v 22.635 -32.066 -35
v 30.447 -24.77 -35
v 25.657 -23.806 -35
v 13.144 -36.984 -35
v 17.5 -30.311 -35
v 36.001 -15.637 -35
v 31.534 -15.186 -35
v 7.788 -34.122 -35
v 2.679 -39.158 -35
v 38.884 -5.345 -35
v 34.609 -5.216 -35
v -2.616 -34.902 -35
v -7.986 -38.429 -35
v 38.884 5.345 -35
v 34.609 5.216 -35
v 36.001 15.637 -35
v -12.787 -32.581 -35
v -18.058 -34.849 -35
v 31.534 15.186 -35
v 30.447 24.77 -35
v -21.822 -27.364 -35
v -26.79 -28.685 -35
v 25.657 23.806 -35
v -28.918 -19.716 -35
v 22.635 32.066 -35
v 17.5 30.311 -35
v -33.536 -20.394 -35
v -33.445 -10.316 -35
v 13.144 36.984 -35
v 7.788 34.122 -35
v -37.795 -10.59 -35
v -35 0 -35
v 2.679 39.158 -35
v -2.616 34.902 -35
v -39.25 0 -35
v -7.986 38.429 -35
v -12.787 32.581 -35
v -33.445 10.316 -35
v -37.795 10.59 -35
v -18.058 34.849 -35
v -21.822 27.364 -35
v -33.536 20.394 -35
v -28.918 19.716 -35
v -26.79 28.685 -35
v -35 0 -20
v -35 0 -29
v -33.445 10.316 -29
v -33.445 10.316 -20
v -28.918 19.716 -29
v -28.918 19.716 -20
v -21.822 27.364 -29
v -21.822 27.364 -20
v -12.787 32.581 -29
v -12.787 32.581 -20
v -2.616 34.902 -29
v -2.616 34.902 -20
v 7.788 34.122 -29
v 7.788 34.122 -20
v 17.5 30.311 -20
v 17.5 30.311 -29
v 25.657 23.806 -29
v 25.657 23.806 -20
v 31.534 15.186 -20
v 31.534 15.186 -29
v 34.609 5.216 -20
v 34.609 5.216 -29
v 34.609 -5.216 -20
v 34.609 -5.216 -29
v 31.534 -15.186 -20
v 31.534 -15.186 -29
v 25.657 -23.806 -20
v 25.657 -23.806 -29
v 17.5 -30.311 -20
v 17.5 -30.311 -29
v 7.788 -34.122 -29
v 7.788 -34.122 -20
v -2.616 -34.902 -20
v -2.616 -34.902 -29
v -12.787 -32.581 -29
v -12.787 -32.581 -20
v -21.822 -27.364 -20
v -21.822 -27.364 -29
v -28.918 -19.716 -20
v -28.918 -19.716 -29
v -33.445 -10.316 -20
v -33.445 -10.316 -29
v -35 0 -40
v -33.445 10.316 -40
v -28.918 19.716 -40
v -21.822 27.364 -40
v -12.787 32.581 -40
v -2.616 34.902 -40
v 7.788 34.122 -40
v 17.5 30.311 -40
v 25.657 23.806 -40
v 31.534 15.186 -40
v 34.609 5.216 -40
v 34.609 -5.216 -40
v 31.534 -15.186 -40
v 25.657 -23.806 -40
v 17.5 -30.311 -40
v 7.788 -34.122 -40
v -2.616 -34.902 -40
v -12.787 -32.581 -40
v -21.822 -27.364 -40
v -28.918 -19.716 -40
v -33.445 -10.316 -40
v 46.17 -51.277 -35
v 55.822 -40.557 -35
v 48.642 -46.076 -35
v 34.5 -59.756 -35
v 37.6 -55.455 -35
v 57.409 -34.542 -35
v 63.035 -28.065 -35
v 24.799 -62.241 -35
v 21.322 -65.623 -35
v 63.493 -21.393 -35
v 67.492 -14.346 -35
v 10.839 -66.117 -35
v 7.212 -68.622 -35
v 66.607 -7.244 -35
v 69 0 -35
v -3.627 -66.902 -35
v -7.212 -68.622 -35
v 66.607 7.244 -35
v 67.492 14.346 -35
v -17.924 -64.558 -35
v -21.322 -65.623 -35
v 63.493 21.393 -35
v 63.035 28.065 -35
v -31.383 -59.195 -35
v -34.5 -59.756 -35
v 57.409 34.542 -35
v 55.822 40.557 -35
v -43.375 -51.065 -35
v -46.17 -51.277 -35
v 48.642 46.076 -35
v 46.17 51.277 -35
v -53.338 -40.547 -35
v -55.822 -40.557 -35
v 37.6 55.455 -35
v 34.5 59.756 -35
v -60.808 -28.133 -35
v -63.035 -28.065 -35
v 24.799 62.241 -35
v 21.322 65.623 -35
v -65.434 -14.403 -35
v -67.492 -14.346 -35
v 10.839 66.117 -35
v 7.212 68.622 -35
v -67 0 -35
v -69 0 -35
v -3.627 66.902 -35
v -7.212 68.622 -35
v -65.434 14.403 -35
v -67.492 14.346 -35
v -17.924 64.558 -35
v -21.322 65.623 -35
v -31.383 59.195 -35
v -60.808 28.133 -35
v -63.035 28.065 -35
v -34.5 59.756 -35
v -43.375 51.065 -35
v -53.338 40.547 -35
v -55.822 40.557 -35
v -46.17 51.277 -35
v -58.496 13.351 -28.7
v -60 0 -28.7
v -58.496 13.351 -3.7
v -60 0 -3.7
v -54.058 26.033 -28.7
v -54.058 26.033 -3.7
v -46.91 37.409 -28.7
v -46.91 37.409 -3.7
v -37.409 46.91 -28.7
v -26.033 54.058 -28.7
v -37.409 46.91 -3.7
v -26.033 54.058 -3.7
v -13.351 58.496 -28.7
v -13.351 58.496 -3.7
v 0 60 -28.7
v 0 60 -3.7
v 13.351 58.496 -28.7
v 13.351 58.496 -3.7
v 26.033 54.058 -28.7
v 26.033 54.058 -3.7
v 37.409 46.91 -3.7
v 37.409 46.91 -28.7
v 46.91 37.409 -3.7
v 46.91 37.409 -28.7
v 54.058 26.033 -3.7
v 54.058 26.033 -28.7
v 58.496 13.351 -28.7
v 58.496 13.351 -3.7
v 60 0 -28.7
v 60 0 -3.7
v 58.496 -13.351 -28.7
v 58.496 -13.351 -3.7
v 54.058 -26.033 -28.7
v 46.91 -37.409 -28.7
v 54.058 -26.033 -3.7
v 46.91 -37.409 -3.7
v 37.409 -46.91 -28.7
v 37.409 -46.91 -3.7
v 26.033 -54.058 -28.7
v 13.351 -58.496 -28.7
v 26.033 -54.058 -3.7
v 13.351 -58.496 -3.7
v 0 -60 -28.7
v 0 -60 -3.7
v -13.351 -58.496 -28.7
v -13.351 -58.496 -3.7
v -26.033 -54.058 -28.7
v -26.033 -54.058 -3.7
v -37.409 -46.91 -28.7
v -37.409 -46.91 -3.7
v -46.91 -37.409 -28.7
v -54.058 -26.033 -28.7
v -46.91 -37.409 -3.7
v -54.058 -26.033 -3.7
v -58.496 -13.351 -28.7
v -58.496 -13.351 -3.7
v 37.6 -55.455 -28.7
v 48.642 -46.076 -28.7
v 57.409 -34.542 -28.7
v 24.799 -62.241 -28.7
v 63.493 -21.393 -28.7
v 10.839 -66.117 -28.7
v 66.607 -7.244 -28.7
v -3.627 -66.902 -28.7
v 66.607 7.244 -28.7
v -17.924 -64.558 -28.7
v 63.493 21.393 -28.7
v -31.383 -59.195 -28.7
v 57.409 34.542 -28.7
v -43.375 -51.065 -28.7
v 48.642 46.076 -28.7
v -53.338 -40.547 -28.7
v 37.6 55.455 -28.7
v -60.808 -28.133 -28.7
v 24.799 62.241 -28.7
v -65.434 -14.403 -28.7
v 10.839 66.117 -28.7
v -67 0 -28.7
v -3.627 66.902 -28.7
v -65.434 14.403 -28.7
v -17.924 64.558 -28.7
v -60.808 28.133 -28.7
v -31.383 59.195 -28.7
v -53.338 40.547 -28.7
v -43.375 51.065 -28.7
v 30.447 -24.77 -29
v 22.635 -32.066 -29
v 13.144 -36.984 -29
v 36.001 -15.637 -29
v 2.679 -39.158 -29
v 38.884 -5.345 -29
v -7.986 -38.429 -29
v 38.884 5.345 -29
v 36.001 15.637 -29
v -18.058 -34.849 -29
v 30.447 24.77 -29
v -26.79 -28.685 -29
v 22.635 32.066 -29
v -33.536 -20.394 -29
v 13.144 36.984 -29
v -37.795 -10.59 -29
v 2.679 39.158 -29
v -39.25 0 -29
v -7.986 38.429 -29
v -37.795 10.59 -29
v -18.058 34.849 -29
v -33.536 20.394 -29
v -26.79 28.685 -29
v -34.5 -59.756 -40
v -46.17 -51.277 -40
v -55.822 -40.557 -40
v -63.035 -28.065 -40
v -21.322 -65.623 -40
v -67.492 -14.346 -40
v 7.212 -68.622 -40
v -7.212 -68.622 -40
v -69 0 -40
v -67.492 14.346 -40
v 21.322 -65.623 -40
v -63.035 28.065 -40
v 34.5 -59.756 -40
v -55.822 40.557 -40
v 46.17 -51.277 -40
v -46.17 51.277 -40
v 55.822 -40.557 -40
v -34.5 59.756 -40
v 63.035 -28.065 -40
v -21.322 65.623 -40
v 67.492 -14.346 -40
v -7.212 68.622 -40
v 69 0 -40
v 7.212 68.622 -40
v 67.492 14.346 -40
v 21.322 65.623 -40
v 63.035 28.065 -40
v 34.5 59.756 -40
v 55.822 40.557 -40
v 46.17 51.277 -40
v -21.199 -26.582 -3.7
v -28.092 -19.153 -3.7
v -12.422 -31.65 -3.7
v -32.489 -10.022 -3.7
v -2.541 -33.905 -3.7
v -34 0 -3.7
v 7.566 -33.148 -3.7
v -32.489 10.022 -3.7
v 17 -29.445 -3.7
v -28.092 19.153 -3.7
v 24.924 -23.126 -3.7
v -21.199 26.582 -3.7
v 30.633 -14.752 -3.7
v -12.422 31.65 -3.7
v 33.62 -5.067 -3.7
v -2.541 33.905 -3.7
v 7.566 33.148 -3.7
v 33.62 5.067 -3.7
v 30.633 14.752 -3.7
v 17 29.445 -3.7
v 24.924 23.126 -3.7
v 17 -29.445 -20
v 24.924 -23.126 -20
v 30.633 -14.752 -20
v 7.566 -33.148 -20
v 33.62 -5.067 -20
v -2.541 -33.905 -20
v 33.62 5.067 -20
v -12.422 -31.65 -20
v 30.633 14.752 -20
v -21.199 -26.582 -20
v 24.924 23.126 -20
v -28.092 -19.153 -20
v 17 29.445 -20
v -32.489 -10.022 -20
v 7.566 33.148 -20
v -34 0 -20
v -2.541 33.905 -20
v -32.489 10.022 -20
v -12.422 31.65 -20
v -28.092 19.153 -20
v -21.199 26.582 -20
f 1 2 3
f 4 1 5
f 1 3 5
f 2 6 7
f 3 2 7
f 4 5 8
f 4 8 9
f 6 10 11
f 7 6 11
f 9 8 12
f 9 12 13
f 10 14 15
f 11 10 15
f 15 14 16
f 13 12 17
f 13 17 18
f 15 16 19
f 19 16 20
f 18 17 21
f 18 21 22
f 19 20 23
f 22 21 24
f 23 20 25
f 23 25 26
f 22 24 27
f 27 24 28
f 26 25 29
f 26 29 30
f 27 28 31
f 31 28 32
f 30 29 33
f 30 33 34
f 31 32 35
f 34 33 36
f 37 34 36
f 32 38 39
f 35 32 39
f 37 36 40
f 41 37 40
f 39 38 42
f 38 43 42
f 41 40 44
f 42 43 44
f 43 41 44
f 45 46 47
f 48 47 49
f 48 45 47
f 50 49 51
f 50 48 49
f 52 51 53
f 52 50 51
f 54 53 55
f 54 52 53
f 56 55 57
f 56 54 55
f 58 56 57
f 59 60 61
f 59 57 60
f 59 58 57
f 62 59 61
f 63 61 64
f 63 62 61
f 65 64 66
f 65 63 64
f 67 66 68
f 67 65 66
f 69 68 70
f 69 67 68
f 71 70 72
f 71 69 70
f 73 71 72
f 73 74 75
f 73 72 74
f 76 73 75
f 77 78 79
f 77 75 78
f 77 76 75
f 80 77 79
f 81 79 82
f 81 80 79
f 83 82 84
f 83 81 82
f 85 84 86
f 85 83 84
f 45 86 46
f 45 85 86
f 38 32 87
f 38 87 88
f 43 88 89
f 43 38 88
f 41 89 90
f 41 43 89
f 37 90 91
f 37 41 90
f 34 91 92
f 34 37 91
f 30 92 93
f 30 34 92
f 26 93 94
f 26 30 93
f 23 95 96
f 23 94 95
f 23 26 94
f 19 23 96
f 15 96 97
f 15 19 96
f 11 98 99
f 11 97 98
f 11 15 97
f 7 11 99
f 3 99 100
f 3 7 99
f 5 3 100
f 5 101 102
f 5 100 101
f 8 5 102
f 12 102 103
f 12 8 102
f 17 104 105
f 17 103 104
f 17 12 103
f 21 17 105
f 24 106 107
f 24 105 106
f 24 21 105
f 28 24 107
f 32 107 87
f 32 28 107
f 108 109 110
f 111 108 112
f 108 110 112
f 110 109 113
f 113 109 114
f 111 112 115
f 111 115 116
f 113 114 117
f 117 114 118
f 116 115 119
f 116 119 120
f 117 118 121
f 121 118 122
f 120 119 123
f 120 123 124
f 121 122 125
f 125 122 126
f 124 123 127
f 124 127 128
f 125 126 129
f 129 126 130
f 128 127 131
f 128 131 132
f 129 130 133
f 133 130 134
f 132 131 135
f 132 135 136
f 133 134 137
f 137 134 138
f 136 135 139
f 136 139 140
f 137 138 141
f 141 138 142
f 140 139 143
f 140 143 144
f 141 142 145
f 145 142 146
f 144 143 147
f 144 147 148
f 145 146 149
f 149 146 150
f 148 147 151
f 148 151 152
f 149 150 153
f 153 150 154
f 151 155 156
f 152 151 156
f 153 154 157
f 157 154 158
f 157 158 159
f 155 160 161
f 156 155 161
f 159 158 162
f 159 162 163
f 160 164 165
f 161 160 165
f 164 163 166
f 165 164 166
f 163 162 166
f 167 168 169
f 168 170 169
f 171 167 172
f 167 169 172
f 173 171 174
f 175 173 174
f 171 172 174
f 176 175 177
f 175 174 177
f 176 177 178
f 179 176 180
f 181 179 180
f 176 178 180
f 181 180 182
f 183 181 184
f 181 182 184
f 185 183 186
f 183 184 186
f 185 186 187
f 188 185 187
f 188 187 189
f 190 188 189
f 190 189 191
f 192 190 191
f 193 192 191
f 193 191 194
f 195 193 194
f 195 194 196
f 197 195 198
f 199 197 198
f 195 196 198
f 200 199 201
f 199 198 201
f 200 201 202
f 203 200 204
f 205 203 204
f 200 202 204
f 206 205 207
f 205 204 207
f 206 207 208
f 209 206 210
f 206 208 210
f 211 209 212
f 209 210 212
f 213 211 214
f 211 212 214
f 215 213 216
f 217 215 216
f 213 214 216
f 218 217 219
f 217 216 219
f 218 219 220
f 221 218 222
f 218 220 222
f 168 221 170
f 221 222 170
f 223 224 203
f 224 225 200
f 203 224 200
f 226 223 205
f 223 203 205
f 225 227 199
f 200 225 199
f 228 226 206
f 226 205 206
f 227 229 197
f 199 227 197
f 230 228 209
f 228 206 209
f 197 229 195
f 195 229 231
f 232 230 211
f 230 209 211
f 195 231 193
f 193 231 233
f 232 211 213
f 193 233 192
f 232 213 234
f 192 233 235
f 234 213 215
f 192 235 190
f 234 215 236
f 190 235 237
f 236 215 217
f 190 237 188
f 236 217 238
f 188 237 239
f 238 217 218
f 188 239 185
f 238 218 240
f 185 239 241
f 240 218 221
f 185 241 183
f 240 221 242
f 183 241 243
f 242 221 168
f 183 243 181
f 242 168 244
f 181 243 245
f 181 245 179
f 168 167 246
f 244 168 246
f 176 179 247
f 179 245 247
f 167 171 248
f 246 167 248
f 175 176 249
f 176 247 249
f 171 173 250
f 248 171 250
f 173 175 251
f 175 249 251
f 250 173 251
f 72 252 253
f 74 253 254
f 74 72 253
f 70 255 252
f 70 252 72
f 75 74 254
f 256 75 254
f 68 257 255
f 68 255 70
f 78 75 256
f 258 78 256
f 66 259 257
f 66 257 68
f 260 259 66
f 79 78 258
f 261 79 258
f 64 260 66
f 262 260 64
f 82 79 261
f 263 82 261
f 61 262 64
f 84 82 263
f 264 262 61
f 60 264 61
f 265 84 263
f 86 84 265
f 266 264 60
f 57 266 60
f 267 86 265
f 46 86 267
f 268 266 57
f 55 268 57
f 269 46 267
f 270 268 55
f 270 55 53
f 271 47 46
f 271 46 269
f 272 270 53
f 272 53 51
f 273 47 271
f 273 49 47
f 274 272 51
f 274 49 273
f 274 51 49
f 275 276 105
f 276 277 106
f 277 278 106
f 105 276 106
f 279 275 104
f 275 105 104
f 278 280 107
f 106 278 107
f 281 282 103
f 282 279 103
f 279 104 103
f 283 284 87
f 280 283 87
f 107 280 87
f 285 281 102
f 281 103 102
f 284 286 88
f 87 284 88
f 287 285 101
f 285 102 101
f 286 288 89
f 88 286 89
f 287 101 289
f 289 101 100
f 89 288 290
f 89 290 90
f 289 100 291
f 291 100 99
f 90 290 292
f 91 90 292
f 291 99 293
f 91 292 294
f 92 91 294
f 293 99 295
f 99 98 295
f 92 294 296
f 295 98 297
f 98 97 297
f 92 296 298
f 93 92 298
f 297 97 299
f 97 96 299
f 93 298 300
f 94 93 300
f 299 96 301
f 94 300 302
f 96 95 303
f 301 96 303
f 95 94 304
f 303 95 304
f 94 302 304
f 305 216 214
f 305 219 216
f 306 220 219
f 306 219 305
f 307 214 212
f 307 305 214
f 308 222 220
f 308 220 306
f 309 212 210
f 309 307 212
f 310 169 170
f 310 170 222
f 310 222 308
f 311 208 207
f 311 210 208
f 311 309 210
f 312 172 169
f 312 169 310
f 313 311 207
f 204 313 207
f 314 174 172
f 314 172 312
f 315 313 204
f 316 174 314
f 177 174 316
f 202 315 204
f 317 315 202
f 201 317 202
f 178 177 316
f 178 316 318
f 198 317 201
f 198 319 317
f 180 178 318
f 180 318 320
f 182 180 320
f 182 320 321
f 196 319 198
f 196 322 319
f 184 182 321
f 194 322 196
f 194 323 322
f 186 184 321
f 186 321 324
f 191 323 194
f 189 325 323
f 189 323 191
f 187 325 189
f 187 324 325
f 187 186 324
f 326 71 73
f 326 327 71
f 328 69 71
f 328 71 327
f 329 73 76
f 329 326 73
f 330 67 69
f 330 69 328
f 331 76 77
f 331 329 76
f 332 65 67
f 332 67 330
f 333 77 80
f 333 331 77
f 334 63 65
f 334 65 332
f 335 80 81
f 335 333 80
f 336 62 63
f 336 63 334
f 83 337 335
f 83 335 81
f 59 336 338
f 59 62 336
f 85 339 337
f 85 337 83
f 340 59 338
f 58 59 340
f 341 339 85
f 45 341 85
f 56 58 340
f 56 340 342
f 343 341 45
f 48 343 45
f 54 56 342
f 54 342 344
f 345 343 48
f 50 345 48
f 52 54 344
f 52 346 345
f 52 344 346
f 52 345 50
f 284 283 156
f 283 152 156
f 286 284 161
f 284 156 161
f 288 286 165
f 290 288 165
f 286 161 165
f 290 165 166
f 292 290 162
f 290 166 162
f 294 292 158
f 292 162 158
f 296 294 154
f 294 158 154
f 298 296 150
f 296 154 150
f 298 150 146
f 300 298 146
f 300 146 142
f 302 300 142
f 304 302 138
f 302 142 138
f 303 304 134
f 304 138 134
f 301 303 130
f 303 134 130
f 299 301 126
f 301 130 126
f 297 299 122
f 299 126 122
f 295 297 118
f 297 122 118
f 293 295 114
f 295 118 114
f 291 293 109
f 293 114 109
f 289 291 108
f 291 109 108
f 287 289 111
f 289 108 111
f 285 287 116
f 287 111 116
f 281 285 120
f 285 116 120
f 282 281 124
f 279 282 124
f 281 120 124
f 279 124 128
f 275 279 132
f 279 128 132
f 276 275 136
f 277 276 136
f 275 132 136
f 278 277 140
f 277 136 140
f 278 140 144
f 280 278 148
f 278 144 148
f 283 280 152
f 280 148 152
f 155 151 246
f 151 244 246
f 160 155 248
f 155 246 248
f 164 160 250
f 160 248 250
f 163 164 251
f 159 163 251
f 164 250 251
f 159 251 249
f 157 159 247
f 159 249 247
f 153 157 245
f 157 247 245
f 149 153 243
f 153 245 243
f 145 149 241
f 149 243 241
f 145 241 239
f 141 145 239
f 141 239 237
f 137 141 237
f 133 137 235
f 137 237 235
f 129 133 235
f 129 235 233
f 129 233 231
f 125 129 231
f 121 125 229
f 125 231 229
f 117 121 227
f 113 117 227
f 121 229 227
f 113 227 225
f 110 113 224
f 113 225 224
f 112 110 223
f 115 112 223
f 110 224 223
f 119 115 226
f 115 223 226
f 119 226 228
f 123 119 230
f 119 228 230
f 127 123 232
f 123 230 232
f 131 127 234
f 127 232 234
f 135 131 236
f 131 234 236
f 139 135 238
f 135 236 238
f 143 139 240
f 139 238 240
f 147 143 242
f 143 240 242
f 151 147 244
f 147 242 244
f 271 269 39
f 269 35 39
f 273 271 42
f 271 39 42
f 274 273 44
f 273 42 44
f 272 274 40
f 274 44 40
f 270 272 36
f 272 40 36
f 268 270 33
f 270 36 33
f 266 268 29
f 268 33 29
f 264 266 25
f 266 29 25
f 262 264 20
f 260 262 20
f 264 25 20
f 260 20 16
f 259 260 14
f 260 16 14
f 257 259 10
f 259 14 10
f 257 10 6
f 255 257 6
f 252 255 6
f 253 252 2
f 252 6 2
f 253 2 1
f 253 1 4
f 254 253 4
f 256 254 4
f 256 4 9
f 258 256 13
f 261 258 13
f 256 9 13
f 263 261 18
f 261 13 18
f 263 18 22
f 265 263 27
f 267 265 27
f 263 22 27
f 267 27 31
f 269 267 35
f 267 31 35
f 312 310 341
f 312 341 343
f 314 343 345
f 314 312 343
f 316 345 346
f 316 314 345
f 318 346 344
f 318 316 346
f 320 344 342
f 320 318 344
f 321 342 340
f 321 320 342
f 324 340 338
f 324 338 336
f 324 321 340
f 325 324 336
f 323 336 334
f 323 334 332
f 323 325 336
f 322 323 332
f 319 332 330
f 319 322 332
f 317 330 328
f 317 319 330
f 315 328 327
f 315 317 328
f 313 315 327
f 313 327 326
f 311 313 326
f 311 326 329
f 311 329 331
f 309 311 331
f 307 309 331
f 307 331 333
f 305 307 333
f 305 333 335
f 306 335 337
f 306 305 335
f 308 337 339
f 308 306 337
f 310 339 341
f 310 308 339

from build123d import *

# Parameters (mm, degrees)
SKETCH1_R           = 70
BOSS_EXTRUDE1_DEPTH = 40
SKETCH3_W           = 14
SKETCH3_H           = 32.4
SKETCH5_W           = 26.233930481
SKETCH5_H           = 6
SKETCH6_W           = 149.593137009
SKETCH6_H           = 50.047703926
CUT_EXTRUDE1_DEPTH  = 86


with BuildPart() as part:
    # Sketch1 → Boss-Extrude1 (new body, symmetric)
    with BuildSketch(Plane.XY):
        Circle(SKETCH1_R)
    extrude(amount=BOSS_EXTRUDE1_DEPTH, both=True)

    # Sketch2 → Cut-Revolve1 (revolve, cut)
    with BuildSketch(Plane(origin=(0, 0, 0), x_dir=(1, 0, 0), z_dir=(0, 1, 0))):
        Polygon((-69, 40), (-69, 35), (-67, 35), (-67, 28.7), (-60, 28.7), (-60, 3.7), (-67, 3.7), (-67, -2.6), (-69, -2.6), (-69, -44.705491592), (-73.643536697, -44.705491592), (-73.643536697, 40), align=None)
    revolve(axis=Axis((0, 0, 0), (0, 0, -1)), mode=Mode.SUBTRACT)

    # Sketch3 → Cut-Revolve2 (revolve, cut)
    with BuildSketch(Plane(origin=(0, 0, 0), x_dir=(1, 0, 0), z_dir=(0, 1, 0))):
        with Locations((-62, -23.8)):
            Rectangle(SKETCH3_W, SKETCH3_H)
    revolve(axis=Axis((0, 0, 0), (0, 0, 1)), mode=Mode.SUBTRACT)

    # Sketch4 → Cut-Revolve3 (revolve, cut)
    with BuildSketch(Plane(origin=(0, 0, 0), x_dir=(1, 0, 0), z_dir=(0, 1, 0))):
        Polygon((0, 42.623044552), (-35, 42.623044552), (-35, 20), (-34, 20), (-34, -40), (0, -40), align=None)
    revolve(axis=Axis((0, 0, 0), (0, 0, -1)), mode=Mode.SUBTRACT)

    # Sketch5 → Cut-Revolve4 (revolve, cut)
    with BuildSketch(Plane(origin=(0, 0, 0), x_dir=(1, 0, 0), z_dir=(0, 1, 0))):
        with Locations((-26.133034759, 32)):
            Rectangle(SKETCH5_W, SKETCH5_H)
    revolve(axis=Axis((0, 0, 0), (0, 0, -1)), mode=Mode.SUBTRACT)

    # Sketch6 → Cut-Extrude1 (cut, symmetric)
    with BuildSketch(Plane(origin=(0, 0, 0), x_dir=(1, 0, 0), z_dir=(0, 1, 0))):
        with Locations((-0.733299692, -21.323851963)):
            Rectangle(SKETCH6_W, SKETCH6_H)
    extrude(amount=CUT_EXTRUDE1_DEPTH, both=True, mode=Mode.SUBTRACT)


solid = part.part
